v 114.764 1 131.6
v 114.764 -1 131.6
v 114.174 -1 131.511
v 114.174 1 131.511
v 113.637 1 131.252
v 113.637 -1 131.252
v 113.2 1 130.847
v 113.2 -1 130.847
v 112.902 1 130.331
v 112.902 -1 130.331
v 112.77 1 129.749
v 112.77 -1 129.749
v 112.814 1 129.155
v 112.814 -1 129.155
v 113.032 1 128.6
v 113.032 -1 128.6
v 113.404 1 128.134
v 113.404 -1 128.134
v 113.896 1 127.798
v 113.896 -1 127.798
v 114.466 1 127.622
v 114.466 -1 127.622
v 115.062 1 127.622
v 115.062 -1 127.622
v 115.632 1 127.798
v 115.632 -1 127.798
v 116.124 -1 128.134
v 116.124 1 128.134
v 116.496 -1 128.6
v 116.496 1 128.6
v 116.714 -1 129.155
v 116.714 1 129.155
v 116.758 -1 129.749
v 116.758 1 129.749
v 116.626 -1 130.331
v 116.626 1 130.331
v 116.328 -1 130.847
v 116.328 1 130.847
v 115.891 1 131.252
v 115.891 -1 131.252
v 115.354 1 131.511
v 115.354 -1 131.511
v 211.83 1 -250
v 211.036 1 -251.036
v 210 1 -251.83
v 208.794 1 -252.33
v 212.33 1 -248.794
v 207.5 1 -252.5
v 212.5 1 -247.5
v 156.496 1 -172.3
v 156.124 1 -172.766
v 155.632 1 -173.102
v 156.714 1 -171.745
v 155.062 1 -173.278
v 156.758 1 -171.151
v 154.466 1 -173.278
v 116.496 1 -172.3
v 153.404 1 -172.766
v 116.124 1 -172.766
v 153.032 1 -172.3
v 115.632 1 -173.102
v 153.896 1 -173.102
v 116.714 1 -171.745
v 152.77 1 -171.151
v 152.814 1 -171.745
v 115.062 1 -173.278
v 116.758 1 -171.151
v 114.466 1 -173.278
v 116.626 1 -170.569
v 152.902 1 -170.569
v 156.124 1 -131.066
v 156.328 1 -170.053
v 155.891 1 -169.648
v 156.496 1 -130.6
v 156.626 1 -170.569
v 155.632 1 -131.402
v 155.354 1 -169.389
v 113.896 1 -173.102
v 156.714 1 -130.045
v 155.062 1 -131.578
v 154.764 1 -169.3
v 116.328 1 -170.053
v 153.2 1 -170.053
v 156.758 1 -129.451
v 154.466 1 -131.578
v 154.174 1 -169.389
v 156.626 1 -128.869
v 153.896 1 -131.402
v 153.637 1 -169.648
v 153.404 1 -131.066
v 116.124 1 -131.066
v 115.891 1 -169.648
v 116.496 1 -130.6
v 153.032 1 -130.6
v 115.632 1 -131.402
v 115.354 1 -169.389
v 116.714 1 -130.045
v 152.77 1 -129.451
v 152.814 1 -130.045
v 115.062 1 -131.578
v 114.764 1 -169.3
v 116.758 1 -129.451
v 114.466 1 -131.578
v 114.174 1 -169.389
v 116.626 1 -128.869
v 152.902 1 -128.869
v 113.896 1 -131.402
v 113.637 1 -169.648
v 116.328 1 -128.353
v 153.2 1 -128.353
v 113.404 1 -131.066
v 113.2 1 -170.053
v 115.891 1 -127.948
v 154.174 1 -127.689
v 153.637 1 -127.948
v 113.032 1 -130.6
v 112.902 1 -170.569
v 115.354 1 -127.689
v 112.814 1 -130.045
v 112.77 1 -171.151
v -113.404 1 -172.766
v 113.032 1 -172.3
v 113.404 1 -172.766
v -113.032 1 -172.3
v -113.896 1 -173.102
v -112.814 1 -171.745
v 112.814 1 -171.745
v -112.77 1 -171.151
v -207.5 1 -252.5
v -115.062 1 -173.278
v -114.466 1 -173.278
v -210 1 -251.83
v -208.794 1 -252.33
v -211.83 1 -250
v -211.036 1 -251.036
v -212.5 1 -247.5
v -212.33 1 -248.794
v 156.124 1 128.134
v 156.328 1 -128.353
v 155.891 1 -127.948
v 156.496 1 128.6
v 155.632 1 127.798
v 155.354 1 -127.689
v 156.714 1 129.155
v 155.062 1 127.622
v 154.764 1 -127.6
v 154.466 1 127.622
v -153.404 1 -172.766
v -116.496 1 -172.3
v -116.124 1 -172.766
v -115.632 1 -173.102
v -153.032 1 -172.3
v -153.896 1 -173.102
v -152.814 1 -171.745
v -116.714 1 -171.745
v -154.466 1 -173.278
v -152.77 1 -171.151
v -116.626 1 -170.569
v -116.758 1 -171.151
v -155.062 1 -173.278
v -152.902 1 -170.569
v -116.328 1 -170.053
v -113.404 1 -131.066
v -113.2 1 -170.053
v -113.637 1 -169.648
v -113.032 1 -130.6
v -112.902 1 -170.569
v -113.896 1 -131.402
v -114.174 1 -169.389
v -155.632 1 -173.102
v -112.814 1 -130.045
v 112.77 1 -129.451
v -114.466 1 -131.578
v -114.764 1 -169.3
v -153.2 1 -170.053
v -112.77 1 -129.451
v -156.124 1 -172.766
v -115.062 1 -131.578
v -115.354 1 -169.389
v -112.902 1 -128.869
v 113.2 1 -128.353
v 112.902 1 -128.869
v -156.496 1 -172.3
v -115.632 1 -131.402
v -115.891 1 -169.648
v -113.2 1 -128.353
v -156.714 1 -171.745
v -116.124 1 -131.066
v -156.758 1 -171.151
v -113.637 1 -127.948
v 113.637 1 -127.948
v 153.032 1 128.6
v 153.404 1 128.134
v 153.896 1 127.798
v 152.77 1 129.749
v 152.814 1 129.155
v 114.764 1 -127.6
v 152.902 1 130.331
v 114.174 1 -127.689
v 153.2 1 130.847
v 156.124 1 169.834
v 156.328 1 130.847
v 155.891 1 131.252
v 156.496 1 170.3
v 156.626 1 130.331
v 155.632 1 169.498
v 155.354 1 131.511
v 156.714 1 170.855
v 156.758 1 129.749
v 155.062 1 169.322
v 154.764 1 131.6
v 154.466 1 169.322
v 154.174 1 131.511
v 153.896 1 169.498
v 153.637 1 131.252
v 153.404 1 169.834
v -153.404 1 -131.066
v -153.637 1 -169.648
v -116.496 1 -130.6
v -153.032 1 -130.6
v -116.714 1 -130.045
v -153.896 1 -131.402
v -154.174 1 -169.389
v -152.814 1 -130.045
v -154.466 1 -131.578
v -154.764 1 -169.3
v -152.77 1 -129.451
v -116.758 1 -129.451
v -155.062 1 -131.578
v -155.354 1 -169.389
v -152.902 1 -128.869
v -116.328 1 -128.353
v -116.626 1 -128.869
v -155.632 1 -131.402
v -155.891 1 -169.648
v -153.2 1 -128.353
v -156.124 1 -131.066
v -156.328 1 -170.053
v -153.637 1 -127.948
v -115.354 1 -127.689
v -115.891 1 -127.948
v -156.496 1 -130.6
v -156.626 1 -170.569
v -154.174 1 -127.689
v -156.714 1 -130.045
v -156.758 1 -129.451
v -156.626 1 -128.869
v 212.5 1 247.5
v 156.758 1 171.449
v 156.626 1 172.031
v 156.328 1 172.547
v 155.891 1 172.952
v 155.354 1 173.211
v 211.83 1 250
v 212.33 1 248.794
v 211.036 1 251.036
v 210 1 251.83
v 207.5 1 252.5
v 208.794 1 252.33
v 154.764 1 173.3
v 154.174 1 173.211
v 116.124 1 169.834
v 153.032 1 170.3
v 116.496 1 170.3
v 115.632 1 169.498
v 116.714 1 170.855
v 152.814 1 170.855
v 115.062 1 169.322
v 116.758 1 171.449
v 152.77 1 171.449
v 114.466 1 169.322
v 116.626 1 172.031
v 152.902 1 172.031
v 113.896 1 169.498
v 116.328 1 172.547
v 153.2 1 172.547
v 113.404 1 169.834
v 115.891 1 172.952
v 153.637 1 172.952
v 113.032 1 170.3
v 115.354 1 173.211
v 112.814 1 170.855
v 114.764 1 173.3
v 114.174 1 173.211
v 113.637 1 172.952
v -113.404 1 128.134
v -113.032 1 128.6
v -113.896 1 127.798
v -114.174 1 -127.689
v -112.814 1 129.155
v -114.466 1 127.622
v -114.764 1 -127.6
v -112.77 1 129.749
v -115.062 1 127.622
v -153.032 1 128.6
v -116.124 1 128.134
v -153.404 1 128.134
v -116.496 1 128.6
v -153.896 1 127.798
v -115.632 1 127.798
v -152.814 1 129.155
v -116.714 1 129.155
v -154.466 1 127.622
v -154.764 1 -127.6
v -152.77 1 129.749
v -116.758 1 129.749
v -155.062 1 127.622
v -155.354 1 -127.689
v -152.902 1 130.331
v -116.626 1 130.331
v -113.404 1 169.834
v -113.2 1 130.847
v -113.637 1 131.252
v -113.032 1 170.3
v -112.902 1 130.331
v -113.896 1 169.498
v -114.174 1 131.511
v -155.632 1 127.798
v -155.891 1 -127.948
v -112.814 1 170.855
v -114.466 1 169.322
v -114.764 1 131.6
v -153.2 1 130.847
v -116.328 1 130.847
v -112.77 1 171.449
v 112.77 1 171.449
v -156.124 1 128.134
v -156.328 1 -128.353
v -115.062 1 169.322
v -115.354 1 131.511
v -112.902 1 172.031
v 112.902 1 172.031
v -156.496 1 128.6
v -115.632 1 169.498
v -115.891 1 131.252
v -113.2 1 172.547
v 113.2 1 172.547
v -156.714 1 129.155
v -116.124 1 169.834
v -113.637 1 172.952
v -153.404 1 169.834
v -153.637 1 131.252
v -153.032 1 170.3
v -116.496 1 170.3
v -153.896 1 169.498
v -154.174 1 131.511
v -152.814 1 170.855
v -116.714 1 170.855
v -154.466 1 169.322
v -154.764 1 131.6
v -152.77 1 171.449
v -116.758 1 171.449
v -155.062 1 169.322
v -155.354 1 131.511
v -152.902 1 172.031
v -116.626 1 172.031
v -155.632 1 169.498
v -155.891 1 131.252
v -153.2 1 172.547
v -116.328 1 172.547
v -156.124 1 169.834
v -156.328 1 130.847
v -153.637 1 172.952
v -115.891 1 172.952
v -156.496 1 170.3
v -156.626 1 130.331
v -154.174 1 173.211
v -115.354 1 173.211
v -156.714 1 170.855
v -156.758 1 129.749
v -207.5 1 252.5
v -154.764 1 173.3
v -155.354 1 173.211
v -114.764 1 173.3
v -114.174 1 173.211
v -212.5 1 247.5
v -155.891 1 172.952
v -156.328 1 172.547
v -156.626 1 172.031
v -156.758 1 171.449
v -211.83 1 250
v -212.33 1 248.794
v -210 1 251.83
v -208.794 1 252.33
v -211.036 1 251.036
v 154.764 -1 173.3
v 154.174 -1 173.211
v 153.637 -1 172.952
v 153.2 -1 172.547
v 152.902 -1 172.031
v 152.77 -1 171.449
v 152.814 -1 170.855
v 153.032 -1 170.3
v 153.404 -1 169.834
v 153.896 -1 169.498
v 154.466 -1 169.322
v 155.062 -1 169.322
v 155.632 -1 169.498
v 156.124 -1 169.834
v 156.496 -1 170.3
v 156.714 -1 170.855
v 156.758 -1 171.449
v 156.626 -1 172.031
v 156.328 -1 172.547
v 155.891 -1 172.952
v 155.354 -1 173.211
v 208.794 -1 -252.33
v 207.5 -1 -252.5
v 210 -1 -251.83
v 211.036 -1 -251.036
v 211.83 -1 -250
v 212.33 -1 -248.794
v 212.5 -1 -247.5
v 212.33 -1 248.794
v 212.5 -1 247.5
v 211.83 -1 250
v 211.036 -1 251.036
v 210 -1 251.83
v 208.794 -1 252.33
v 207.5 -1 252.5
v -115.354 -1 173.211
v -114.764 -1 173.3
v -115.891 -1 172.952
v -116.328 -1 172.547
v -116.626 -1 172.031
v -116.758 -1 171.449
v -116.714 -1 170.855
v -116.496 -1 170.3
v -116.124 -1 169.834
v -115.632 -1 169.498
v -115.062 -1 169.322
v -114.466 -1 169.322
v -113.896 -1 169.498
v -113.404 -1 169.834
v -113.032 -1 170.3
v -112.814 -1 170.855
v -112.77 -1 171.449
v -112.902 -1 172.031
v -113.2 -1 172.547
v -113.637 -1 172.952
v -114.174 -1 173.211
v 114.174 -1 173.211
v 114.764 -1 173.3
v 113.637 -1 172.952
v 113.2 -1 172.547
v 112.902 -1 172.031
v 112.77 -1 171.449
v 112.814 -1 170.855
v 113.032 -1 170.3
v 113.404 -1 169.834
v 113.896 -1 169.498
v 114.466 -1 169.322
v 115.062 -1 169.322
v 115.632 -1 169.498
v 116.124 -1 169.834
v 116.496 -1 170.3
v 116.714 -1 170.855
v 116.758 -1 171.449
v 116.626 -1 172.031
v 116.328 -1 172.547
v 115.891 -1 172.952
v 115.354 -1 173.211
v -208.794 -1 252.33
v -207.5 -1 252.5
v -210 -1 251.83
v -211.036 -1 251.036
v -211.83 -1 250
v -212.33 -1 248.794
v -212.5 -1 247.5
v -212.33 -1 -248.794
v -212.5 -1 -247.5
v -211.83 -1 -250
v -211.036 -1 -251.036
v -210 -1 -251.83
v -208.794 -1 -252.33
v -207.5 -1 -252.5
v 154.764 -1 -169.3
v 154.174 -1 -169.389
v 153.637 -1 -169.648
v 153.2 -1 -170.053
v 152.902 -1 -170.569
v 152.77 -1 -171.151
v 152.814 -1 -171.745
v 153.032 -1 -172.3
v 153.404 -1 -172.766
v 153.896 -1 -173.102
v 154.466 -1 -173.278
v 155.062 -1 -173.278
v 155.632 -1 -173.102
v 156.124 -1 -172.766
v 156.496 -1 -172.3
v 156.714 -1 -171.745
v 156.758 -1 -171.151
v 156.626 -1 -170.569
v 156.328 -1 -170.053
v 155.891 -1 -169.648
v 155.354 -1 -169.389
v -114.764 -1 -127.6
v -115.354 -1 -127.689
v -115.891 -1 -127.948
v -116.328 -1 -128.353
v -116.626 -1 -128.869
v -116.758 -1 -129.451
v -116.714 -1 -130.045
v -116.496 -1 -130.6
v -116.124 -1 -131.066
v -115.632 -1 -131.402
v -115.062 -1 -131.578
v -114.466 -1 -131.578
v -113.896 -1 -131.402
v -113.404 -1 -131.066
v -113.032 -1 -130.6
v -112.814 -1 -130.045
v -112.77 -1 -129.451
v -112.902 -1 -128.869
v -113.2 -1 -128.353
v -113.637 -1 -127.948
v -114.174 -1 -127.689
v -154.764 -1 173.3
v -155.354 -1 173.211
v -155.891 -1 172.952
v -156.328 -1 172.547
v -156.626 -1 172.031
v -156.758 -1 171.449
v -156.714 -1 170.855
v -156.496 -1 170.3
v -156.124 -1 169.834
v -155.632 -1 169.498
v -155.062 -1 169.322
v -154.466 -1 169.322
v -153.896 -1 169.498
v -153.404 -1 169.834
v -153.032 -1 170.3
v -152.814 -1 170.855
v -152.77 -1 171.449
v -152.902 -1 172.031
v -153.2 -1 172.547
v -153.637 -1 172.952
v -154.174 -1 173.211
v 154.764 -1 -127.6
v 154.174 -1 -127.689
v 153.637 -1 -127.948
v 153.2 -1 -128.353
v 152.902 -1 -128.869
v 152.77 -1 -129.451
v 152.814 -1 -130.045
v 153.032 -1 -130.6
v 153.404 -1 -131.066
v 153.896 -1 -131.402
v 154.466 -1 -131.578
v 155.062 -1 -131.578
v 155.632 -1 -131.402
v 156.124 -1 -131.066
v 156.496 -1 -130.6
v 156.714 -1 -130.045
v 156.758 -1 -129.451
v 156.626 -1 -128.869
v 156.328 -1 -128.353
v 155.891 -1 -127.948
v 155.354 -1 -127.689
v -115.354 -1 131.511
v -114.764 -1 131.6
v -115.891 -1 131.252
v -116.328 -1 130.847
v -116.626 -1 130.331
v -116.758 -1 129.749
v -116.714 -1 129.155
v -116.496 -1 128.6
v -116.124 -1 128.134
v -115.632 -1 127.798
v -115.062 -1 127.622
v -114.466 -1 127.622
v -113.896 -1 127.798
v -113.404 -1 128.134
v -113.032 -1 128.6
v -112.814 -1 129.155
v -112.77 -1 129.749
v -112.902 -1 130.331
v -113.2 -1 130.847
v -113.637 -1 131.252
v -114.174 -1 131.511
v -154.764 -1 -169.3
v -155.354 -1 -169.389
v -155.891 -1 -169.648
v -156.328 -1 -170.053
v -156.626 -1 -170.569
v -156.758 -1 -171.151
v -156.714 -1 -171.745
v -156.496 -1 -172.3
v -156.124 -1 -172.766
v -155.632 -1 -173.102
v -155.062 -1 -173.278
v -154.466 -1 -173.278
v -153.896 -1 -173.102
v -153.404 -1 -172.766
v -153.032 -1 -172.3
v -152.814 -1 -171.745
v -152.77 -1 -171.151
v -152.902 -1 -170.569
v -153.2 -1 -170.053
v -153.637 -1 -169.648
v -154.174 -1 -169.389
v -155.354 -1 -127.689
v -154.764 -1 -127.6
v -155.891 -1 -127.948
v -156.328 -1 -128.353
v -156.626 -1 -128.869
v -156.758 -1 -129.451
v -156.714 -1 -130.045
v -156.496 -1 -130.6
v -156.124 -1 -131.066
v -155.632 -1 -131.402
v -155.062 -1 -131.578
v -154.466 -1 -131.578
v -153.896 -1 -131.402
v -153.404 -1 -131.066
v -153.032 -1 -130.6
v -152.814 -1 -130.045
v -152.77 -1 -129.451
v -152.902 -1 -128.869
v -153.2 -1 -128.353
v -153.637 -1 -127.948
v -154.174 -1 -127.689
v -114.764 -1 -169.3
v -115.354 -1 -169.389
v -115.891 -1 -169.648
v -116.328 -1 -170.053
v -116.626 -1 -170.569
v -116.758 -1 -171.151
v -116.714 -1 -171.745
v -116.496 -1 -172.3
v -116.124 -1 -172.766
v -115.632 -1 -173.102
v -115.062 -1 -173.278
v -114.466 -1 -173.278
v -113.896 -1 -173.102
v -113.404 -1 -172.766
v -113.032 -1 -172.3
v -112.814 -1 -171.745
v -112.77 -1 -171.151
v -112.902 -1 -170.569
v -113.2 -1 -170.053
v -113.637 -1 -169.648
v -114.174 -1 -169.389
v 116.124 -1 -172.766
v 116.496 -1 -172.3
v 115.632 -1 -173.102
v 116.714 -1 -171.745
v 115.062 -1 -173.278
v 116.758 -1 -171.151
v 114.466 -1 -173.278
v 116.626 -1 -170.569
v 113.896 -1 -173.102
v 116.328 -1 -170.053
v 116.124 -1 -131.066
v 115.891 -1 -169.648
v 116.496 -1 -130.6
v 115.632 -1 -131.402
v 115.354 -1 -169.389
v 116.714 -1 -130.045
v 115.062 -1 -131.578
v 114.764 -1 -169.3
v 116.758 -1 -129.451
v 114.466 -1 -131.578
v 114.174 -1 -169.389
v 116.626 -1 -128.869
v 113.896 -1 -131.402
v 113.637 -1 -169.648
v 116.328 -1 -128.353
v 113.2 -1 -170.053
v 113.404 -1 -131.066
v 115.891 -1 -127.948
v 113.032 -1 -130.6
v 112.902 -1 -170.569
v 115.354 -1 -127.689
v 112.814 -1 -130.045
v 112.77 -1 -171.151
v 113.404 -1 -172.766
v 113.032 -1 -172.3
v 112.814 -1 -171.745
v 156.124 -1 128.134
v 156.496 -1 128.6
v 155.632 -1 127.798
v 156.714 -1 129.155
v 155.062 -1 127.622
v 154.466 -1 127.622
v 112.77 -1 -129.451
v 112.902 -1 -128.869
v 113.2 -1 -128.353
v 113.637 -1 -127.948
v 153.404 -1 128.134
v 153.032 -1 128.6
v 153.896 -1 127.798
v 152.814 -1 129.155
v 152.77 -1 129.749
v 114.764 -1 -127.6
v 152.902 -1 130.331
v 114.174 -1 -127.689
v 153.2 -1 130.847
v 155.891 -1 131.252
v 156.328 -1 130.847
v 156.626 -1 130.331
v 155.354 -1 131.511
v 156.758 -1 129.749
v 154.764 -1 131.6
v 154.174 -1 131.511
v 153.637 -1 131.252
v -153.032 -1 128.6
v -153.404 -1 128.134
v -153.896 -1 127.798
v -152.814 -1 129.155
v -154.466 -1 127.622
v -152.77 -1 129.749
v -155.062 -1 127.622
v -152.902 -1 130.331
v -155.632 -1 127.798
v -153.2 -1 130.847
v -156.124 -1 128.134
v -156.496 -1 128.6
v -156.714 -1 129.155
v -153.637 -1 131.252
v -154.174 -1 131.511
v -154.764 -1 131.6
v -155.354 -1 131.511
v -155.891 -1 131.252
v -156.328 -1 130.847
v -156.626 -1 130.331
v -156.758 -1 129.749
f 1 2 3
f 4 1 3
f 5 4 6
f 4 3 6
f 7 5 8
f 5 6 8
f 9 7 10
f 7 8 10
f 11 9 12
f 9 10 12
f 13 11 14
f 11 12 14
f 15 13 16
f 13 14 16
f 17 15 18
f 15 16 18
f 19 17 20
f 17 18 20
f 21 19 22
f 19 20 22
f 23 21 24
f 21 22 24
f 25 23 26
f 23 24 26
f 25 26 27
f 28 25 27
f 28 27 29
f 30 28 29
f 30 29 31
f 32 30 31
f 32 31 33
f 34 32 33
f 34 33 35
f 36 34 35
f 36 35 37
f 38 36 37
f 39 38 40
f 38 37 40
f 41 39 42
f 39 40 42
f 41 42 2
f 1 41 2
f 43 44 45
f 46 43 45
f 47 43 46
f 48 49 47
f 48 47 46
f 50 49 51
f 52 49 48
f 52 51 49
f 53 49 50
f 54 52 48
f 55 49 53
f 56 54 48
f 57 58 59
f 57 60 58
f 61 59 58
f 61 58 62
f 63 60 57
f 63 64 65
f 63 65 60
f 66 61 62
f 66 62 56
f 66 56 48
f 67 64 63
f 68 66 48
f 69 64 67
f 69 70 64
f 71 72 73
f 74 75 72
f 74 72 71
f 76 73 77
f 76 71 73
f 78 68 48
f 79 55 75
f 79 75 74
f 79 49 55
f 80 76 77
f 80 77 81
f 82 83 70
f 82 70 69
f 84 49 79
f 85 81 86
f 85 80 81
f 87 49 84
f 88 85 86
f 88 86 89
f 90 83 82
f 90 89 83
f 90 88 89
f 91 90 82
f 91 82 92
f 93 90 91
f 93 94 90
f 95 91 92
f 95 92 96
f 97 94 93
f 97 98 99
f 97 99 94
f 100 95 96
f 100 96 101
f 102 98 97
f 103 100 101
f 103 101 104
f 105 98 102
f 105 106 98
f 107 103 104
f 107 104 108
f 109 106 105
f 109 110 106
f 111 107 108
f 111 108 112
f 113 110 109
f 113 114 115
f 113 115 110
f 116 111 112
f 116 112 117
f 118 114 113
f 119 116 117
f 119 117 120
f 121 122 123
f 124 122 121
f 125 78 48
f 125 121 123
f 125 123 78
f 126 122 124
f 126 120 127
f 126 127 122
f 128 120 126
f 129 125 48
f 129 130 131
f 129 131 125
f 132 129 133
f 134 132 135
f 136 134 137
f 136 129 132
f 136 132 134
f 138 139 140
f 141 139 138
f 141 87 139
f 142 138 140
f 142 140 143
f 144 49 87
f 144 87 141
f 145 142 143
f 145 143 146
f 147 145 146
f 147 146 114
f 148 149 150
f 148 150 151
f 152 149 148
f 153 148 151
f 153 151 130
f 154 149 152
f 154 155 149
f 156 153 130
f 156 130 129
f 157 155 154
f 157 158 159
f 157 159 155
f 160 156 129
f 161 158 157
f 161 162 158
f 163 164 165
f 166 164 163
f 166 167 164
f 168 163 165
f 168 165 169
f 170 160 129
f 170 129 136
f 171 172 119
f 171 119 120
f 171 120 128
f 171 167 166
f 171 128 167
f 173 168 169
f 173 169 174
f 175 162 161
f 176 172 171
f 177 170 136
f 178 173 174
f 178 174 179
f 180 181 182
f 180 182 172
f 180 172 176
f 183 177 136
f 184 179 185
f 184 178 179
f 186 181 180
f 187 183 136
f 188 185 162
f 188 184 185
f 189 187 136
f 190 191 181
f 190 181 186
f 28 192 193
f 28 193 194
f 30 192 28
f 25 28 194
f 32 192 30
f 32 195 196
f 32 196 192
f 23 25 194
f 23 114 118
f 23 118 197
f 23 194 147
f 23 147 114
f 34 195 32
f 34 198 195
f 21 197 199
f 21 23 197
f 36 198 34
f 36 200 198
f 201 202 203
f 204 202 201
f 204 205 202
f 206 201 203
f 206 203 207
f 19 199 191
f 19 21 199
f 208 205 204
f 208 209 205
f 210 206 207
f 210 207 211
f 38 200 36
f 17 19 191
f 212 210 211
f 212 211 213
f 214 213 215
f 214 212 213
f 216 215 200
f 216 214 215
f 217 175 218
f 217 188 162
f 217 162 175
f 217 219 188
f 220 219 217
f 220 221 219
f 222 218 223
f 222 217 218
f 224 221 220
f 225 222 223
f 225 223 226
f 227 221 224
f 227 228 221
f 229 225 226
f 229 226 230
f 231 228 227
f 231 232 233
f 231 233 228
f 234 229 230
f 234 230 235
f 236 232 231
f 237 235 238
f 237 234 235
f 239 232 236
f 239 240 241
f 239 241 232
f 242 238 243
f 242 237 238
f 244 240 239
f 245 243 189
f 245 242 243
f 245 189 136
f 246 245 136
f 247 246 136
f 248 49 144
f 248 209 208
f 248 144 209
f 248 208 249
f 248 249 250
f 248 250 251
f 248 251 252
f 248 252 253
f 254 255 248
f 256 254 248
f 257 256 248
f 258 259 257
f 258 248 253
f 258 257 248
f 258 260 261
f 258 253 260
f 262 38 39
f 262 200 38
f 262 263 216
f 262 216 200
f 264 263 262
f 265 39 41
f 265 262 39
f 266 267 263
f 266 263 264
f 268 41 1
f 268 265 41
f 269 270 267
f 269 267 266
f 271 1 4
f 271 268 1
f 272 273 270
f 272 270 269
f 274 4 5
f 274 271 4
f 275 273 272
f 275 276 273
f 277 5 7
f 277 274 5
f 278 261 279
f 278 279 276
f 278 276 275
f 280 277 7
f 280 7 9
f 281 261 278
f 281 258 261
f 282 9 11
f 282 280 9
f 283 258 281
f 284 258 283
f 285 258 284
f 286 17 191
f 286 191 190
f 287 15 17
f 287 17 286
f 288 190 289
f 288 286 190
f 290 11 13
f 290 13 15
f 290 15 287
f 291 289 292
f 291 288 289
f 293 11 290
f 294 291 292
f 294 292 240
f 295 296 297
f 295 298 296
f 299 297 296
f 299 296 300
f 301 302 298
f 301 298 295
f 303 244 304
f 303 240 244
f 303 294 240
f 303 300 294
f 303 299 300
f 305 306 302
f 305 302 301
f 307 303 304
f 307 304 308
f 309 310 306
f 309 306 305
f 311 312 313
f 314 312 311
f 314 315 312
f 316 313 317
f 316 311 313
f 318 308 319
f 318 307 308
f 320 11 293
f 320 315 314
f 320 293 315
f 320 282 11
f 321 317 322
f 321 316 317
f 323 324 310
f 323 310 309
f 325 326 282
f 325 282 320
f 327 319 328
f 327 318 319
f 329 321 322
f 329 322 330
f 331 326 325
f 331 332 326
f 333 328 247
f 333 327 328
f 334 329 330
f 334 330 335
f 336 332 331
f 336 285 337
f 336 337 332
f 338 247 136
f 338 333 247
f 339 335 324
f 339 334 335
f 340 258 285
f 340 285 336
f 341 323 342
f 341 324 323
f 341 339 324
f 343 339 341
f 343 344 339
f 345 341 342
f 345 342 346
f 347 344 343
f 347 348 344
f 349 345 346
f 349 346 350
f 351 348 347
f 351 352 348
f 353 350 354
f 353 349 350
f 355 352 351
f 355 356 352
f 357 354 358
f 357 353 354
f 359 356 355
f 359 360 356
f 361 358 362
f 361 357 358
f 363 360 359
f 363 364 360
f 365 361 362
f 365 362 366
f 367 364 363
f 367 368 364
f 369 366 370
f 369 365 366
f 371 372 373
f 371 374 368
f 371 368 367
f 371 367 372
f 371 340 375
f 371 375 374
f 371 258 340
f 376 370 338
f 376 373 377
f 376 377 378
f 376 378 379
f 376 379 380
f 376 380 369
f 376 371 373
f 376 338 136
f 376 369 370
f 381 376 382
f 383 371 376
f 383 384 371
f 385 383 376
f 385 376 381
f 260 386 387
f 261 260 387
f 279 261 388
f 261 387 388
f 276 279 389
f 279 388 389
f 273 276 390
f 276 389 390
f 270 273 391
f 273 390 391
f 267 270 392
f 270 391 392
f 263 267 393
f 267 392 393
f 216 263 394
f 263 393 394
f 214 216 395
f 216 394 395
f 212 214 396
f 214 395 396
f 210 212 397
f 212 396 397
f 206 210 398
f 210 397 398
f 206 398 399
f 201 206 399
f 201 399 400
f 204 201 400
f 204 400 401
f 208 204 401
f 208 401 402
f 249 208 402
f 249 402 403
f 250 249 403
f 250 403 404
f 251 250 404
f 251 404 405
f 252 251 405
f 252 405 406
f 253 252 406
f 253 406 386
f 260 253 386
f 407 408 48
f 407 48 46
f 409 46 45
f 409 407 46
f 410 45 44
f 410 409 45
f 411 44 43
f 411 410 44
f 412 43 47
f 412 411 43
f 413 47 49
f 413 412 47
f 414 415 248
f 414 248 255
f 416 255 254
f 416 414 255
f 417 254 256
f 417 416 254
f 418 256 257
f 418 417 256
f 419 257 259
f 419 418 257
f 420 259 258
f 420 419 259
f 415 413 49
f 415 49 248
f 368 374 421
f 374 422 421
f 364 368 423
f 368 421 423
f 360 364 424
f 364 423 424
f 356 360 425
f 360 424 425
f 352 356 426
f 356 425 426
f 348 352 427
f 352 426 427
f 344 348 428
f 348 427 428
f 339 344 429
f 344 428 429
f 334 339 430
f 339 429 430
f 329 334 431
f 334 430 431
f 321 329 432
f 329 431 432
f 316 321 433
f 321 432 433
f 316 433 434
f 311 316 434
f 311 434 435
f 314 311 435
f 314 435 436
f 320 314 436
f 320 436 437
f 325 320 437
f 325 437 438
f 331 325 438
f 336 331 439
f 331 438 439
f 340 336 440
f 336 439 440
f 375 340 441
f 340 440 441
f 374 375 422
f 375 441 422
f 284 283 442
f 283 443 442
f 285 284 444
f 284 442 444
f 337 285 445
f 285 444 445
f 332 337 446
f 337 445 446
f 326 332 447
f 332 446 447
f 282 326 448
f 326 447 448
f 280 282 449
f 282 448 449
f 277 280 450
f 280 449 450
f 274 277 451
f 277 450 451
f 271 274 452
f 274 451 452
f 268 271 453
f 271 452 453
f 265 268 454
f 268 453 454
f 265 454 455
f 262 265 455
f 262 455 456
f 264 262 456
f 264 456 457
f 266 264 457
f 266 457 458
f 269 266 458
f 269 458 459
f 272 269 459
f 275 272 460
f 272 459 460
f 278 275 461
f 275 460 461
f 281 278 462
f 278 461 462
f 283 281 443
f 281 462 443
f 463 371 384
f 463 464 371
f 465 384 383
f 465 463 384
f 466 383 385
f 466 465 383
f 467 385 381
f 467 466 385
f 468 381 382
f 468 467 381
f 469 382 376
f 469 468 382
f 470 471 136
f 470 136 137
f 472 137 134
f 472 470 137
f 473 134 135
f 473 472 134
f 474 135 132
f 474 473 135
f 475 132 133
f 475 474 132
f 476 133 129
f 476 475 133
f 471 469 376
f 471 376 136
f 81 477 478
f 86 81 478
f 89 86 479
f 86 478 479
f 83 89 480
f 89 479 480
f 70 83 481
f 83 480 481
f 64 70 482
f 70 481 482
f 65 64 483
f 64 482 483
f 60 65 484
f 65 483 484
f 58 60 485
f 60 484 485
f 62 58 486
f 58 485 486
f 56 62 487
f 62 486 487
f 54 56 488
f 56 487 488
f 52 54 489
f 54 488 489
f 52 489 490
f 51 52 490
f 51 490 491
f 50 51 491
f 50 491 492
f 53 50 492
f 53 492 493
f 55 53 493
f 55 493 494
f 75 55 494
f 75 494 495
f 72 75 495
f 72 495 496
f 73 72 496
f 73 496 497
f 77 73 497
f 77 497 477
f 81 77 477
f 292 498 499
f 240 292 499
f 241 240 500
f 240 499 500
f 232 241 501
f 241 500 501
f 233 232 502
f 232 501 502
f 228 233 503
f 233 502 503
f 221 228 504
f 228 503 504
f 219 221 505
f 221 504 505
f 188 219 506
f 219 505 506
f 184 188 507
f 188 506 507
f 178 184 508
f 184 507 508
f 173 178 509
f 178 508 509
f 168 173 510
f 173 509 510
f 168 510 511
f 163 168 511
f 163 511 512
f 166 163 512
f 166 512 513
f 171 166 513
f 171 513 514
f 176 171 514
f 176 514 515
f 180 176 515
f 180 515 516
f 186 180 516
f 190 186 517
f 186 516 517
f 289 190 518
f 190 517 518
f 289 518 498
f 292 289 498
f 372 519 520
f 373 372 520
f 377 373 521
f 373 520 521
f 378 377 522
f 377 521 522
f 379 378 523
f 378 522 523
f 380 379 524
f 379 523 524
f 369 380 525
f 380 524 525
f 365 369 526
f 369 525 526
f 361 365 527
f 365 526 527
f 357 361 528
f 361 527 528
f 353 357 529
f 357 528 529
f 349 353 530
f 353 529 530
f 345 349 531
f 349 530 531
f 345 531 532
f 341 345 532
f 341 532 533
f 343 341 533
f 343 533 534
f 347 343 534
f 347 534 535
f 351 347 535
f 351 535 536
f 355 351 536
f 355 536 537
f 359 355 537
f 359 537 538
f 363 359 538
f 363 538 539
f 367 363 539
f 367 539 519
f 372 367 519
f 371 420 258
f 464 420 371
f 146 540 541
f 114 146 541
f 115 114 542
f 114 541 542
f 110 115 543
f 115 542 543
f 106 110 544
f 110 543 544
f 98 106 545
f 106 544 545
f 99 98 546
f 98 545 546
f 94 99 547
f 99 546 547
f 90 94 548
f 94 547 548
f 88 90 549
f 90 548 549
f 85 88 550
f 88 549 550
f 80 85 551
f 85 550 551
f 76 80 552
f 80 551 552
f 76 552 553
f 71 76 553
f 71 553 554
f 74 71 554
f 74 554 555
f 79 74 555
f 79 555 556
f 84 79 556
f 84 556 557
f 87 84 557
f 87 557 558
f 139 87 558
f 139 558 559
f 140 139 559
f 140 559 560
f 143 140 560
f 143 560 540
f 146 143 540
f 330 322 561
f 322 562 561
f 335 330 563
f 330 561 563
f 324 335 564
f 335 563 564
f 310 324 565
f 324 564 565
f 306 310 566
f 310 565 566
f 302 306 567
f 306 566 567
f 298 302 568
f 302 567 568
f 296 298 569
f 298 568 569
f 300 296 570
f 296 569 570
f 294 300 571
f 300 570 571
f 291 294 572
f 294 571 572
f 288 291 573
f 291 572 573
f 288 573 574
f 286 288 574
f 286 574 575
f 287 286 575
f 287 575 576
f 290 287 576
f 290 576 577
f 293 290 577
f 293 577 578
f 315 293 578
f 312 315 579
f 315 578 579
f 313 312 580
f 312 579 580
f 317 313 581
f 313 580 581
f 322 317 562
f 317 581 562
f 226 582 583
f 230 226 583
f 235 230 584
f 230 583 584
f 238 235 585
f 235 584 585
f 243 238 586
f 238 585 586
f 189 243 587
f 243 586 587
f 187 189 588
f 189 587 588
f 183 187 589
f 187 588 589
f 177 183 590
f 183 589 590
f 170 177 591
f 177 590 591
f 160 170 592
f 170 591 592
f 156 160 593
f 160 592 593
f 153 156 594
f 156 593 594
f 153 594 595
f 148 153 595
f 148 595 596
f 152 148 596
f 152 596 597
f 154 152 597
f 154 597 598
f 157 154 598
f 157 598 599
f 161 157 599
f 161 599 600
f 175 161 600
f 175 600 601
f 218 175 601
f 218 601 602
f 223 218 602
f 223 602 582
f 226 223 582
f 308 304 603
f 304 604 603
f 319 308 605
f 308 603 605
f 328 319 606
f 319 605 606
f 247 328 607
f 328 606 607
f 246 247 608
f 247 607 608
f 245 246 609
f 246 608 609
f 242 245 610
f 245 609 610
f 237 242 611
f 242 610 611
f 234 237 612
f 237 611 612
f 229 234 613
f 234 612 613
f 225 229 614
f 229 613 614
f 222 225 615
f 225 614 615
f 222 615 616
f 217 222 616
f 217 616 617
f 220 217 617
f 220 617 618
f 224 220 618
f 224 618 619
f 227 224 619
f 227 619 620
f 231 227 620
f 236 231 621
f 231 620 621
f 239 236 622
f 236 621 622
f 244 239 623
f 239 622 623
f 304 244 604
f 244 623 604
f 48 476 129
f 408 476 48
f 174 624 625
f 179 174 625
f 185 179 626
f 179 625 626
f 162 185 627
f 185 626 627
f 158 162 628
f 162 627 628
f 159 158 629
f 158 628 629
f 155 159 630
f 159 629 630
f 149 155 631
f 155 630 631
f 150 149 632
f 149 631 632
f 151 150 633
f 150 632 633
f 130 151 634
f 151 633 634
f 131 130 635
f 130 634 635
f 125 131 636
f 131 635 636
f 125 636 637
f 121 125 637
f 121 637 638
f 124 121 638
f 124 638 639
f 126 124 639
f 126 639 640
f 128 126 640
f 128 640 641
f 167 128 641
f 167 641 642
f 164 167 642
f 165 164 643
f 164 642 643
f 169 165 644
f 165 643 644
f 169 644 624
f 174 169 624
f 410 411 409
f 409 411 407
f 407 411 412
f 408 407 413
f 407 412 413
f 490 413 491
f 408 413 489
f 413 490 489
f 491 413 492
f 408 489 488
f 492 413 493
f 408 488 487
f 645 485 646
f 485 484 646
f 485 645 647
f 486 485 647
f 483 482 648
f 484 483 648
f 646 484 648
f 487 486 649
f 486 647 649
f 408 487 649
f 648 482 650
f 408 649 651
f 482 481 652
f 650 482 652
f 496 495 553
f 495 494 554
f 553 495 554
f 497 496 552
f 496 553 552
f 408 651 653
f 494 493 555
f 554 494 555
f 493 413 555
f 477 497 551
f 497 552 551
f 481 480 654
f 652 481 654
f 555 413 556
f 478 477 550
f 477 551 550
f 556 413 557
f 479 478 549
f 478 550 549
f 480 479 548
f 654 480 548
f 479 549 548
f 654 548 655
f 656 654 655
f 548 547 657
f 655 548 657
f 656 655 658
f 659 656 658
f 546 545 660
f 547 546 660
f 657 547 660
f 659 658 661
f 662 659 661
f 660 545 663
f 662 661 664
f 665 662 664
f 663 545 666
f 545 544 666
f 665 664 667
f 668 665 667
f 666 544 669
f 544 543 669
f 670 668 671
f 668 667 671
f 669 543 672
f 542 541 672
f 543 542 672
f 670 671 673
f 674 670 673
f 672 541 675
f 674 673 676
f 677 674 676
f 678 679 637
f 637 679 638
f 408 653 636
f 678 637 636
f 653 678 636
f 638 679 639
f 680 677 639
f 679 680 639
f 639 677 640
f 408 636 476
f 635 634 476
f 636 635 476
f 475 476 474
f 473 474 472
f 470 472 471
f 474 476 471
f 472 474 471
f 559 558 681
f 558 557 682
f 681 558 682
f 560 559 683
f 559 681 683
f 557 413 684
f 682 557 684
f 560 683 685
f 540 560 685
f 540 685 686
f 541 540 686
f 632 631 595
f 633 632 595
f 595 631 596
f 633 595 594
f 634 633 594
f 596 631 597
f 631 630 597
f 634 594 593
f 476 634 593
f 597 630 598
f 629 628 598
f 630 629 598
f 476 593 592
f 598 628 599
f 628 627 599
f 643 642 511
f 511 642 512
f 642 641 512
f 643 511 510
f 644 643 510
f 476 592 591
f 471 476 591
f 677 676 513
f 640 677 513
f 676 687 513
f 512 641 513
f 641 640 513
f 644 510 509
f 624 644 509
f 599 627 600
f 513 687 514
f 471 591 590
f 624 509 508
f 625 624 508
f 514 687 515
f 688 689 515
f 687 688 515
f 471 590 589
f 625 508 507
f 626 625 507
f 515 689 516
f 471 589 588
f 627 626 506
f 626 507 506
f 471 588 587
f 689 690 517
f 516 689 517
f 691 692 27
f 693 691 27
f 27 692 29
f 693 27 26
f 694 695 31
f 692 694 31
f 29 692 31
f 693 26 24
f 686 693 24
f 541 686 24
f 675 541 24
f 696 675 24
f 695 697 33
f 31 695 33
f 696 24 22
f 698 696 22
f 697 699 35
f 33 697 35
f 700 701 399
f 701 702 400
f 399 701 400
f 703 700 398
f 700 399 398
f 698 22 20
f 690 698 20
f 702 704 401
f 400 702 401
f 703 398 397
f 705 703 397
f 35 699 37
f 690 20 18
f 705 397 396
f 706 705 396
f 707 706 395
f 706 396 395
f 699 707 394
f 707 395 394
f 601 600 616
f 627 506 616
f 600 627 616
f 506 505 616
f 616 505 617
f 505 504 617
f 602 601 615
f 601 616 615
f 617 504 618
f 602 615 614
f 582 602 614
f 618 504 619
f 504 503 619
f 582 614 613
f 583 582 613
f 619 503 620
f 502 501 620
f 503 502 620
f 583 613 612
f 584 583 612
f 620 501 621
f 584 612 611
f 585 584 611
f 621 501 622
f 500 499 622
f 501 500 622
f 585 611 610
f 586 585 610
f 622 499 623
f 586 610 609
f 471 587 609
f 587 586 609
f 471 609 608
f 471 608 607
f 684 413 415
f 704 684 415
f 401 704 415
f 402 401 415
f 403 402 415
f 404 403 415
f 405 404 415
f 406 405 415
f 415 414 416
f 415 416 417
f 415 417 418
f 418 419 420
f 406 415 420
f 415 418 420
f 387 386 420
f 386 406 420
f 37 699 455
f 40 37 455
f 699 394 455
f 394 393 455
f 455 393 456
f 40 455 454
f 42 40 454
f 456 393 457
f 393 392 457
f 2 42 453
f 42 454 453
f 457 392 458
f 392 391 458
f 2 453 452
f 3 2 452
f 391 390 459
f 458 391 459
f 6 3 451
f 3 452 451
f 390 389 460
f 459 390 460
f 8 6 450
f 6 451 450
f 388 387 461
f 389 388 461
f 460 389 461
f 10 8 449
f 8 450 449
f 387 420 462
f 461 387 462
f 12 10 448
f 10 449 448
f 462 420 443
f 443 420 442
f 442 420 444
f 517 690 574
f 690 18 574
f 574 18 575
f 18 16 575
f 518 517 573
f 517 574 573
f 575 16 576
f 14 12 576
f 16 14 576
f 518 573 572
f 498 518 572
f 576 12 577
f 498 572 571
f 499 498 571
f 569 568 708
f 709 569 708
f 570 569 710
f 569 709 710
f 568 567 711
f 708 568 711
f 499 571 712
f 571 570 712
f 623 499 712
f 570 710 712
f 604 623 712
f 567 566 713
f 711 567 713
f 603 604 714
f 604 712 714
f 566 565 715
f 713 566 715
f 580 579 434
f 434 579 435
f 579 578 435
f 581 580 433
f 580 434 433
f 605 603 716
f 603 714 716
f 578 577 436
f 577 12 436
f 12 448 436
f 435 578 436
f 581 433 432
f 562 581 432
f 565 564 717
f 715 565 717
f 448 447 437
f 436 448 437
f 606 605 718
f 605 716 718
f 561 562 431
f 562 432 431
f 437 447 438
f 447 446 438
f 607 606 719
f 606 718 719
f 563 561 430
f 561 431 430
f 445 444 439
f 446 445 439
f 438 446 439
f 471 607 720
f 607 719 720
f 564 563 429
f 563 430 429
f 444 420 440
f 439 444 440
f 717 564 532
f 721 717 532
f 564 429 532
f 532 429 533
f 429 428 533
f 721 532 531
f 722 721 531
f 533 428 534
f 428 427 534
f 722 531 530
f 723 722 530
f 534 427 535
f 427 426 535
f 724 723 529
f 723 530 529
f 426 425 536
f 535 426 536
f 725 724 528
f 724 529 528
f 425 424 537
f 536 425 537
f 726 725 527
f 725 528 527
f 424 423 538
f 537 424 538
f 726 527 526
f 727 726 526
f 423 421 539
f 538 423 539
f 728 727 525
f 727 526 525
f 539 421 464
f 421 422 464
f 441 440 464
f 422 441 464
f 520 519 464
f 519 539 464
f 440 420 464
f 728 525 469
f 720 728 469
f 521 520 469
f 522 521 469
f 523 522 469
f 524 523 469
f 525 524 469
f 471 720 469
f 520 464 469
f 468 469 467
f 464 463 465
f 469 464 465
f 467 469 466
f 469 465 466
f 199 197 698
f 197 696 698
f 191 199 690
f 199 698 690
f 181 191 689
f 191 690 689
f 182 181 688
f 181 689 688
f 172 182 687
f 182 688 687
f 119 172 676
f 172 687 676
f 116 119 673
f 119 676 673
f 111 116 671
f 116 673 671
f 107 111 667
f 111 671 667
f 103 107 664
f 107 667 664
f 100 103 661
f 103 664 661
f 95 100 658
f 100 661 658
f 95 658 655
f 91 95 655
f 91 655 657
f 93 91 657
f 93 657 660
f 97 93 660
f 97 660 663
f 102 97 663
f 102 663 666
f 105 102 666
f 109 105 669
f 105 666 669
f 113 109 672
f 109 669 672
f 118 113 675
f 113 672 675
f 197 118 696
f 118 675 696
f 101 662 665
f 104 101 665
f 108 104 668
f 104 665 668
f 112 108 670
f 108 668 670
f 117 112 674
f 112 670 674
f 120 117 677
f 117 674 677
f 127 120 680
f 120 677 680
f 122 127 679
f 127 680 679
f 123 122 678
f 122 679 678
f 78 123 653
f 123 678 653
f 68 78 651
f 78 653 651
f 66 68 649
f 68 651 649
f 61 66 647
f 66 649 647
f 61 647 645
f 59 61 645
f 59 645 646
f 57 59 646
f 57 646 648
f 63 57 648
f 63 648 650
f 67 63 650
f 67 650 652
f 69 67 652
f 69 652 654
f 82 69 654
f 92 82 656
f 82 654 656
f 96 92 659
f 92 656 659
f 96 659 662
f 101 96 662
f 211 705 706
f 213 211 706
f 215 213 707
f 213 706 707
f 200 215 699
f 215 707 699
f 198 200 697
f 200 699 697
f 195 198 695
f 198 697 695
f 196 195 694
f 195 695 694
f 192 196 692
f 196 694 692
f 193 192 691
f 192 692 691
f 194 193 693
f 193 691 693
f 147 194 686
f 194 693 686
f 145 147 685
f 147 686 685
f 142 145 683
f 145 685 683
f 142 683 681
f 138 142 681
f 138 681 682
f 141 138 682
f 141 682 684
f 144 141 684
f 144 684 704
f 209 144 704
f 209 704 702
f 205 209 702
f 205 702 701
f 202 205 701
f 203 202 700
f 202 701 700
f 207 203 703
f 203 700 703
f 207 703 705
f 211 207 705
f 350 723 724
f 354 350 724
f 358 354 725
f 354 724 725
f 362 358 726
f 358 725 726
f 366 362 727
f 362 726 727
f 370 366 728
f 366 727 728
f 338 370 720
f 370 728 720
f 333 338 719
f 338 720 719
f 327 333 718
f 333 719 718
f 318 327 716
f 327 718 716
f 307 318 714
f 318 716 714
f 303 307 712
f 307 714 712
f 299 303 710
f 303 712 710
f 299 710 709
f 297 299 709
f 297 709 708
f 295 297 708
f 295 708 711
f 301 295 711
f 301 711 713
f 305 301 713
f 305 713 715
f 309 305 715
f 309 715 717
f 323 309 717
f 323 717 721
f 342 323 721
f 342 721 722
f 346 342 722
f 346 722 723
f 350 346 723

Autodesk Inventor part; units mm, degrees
ref_plane "YZ Plane" through (0, 0, 0) normal (1, 0, 0) x (0, 1, 0)
ref_plane "XZ Plane" through (0, 0, 0) normal (0, 1, 0) x (-1, 0, 0)
ref_plane "XY Plane" through (0, 0, 0) normal (0, 0, 1) x (1, 0, 0)
sketch "Sketch2" plane through (0, 0, 0) normal (0, 1, 0) x (-1, 0, 0)
  line L0 (-207.5, 252.5) -> (207.5, 252.5)
  line L1 (212.5, 247.5) -> (212.5, -247.5)
  line L2 (207.5, -252.5) -> (-207.5, -252.5)
  line L3 (-212.5, -247.5) -> (-212.5, 247.5)
  line L4 (-212.5, 252.5) -> (212.5, -252.5) construction
  line L5 (212.5, 252.5) -> (-212.5, -252.5) construction
  arc A0 (212.5, 247.5) -> (207.5, 252.5) centre (207.5, 247.5) ccw
  arc A1 (207.5, -252.5) -> (212.5, -247.5) centre (207.5, -247.5) ccw
  arc A2 (-207.5, 252.5) -> (-212.5, 247.5) centre (-207.5, 247.5) ccw
  arc A3 (-212.5, -247.5) -> (-207.5, -252.5) centre (-207.5, -247.5) ccw
  point P0 (0, 0)
  dimension "d10" = 425
  dimension "d11" = 505
  dimension "d12" = 5
extrude "Extrusion3" add sketch "Sketch2" along normal mid plane 2
sketch "Sketch3" plane through (0, 1, 0) normal (0, 1, 0) x (1, 0, 0)
  line L0 (-212.5, 247.5) -> (-212.5, -247.5) construction
  arc A0 (-212.5, -247.5) -> (-207.5, -252.5) centre (-207.5, -247.5) ccw construction
  line L1 (-207.5, -252.5) -> (207.5, -252.5) construction
  arc A1 (207.5, -252.5) -> (212.5, -247.5) centre (207.5, -247.5) ccw construction
  line L2 (212.5, -247.5) -> (212.5, 247.5) construction
  arc A2 (212.5, 247.5) -> (207.5, 252.5) centre (207.5, 247.5) ccw construction
  line L3 (207.5, 252.5) -> (-207.5, 252.5) construction
  arc A3 (-207.5, 252.5) -> (-212.5, 247.5) centre (-207.5, 247.5) ccw construction
  circle A4 centre (-154.764, 129.6) radius 2.15 construction
  circle A5 centre (-154.764, 171.3) radius 2.15 construction
  circle A6 centre (-114.764, 129.6) radius 2.15 construction
  circle A7 centre (-114.764, 171.3) radius 2.15 construction
  circle A8 centre (114.764, 129.6) radius 2.15 construction
  circle A9 centre (114.764, 171.3) radius 2.15 construction
  circle A10 centre (154.764, 129.6) radius 2.15 construction
  circle A11 centre (154.764, 171.3) radius 2.15 construction
  line L4 (-212.5, 247.5) -> (-212.5, -247.5) construction
  line L5 (-212.5, 0) -> (212.5, 0) construction
  arc A12 (207.5, -252.5) -> (212.5, -247.5) centre (207.5, -247.5) ccw construction
  line L6 (207.5, -252.5) -> (-207.5, -252.5) construction
  arc A13 (-212.5, -247.5) -> (-207.5, -252.5) centre (-207.5, -247.5) ccw construction
  circle A14 centre (-154.764, -129.6) radius 2.15 construction
  circle A15 centre (-154.764, -171.3) radius 2.15 construction
  circle A16 centre (-114.764, -129.6) radius 2.15 construction
  circle A17 centre (-114.764, -171.3) radius 2.15 construction
  circle A18 centre (114.764, -129.6) radius 2.15 construction
  circle A19 centre (114.764, -171.3) radius 2.15 construction
  circle A20 centre (154.764, -129.6) radius 2.15 construction
  circle A21 centre (154.764, -171.3) radius 2.15 construction
  point P0 (0, 0)
  dimension "d15" = 4.3
  dimension "d16" = 4.3
  dimension "d17" = 41.7
  dimension "d18" = 81.2
  dimension "d19" = 57.736
  dimension "d20" = 4.3
  dimension "d21" = 97.736
  dimension "d22" = 4.3
  dimension "d23" = 4.3
  dimension "d24" = 327.264
  dimension "d25" = 4.3
  dimension "d26" = 4.3
  dimension "d27" = 367.264
  dimension "d28" = 4.3
  dimension "d29" = 41.7
  dimension "d30" = 41.7
  dimension "d31" = 81.2
  dimension "d32" = 81.2
  dimension "d33" = 57.736
  dimension "d34" = 97.736
  dimension "d35" = 327.264
  dimension "d36" = 81.2
  dimension "d37" = 122.9
  dimension "d38" = 367.264
hole "Hole1" at (-154.764, 1, 171.3) at (-154.764, 1, 129.6) at (-114.764, 1, 129.6) at (-114.764, 1, 171.3) at (114.764, 1, 171.3) at (114.764, 1, 129.6) at (154.764, 1, 171.3) at (154.764, 1, 129.6) at (-154.764, 1, -171.3) at (-154.764, 1, -129.6) at (-114.764, 1, -129.6) at (-114.764, 1, -171.3) at (154.764, 1, -171.3) at (154.764, 1, -129.6) at (114.764, 1, -129.6) at (114.764, 1, -171.3) direction (0, -1, 0) diameter 4 end through all
properties part number "LiftBase" material "Steel, Galvanized"
